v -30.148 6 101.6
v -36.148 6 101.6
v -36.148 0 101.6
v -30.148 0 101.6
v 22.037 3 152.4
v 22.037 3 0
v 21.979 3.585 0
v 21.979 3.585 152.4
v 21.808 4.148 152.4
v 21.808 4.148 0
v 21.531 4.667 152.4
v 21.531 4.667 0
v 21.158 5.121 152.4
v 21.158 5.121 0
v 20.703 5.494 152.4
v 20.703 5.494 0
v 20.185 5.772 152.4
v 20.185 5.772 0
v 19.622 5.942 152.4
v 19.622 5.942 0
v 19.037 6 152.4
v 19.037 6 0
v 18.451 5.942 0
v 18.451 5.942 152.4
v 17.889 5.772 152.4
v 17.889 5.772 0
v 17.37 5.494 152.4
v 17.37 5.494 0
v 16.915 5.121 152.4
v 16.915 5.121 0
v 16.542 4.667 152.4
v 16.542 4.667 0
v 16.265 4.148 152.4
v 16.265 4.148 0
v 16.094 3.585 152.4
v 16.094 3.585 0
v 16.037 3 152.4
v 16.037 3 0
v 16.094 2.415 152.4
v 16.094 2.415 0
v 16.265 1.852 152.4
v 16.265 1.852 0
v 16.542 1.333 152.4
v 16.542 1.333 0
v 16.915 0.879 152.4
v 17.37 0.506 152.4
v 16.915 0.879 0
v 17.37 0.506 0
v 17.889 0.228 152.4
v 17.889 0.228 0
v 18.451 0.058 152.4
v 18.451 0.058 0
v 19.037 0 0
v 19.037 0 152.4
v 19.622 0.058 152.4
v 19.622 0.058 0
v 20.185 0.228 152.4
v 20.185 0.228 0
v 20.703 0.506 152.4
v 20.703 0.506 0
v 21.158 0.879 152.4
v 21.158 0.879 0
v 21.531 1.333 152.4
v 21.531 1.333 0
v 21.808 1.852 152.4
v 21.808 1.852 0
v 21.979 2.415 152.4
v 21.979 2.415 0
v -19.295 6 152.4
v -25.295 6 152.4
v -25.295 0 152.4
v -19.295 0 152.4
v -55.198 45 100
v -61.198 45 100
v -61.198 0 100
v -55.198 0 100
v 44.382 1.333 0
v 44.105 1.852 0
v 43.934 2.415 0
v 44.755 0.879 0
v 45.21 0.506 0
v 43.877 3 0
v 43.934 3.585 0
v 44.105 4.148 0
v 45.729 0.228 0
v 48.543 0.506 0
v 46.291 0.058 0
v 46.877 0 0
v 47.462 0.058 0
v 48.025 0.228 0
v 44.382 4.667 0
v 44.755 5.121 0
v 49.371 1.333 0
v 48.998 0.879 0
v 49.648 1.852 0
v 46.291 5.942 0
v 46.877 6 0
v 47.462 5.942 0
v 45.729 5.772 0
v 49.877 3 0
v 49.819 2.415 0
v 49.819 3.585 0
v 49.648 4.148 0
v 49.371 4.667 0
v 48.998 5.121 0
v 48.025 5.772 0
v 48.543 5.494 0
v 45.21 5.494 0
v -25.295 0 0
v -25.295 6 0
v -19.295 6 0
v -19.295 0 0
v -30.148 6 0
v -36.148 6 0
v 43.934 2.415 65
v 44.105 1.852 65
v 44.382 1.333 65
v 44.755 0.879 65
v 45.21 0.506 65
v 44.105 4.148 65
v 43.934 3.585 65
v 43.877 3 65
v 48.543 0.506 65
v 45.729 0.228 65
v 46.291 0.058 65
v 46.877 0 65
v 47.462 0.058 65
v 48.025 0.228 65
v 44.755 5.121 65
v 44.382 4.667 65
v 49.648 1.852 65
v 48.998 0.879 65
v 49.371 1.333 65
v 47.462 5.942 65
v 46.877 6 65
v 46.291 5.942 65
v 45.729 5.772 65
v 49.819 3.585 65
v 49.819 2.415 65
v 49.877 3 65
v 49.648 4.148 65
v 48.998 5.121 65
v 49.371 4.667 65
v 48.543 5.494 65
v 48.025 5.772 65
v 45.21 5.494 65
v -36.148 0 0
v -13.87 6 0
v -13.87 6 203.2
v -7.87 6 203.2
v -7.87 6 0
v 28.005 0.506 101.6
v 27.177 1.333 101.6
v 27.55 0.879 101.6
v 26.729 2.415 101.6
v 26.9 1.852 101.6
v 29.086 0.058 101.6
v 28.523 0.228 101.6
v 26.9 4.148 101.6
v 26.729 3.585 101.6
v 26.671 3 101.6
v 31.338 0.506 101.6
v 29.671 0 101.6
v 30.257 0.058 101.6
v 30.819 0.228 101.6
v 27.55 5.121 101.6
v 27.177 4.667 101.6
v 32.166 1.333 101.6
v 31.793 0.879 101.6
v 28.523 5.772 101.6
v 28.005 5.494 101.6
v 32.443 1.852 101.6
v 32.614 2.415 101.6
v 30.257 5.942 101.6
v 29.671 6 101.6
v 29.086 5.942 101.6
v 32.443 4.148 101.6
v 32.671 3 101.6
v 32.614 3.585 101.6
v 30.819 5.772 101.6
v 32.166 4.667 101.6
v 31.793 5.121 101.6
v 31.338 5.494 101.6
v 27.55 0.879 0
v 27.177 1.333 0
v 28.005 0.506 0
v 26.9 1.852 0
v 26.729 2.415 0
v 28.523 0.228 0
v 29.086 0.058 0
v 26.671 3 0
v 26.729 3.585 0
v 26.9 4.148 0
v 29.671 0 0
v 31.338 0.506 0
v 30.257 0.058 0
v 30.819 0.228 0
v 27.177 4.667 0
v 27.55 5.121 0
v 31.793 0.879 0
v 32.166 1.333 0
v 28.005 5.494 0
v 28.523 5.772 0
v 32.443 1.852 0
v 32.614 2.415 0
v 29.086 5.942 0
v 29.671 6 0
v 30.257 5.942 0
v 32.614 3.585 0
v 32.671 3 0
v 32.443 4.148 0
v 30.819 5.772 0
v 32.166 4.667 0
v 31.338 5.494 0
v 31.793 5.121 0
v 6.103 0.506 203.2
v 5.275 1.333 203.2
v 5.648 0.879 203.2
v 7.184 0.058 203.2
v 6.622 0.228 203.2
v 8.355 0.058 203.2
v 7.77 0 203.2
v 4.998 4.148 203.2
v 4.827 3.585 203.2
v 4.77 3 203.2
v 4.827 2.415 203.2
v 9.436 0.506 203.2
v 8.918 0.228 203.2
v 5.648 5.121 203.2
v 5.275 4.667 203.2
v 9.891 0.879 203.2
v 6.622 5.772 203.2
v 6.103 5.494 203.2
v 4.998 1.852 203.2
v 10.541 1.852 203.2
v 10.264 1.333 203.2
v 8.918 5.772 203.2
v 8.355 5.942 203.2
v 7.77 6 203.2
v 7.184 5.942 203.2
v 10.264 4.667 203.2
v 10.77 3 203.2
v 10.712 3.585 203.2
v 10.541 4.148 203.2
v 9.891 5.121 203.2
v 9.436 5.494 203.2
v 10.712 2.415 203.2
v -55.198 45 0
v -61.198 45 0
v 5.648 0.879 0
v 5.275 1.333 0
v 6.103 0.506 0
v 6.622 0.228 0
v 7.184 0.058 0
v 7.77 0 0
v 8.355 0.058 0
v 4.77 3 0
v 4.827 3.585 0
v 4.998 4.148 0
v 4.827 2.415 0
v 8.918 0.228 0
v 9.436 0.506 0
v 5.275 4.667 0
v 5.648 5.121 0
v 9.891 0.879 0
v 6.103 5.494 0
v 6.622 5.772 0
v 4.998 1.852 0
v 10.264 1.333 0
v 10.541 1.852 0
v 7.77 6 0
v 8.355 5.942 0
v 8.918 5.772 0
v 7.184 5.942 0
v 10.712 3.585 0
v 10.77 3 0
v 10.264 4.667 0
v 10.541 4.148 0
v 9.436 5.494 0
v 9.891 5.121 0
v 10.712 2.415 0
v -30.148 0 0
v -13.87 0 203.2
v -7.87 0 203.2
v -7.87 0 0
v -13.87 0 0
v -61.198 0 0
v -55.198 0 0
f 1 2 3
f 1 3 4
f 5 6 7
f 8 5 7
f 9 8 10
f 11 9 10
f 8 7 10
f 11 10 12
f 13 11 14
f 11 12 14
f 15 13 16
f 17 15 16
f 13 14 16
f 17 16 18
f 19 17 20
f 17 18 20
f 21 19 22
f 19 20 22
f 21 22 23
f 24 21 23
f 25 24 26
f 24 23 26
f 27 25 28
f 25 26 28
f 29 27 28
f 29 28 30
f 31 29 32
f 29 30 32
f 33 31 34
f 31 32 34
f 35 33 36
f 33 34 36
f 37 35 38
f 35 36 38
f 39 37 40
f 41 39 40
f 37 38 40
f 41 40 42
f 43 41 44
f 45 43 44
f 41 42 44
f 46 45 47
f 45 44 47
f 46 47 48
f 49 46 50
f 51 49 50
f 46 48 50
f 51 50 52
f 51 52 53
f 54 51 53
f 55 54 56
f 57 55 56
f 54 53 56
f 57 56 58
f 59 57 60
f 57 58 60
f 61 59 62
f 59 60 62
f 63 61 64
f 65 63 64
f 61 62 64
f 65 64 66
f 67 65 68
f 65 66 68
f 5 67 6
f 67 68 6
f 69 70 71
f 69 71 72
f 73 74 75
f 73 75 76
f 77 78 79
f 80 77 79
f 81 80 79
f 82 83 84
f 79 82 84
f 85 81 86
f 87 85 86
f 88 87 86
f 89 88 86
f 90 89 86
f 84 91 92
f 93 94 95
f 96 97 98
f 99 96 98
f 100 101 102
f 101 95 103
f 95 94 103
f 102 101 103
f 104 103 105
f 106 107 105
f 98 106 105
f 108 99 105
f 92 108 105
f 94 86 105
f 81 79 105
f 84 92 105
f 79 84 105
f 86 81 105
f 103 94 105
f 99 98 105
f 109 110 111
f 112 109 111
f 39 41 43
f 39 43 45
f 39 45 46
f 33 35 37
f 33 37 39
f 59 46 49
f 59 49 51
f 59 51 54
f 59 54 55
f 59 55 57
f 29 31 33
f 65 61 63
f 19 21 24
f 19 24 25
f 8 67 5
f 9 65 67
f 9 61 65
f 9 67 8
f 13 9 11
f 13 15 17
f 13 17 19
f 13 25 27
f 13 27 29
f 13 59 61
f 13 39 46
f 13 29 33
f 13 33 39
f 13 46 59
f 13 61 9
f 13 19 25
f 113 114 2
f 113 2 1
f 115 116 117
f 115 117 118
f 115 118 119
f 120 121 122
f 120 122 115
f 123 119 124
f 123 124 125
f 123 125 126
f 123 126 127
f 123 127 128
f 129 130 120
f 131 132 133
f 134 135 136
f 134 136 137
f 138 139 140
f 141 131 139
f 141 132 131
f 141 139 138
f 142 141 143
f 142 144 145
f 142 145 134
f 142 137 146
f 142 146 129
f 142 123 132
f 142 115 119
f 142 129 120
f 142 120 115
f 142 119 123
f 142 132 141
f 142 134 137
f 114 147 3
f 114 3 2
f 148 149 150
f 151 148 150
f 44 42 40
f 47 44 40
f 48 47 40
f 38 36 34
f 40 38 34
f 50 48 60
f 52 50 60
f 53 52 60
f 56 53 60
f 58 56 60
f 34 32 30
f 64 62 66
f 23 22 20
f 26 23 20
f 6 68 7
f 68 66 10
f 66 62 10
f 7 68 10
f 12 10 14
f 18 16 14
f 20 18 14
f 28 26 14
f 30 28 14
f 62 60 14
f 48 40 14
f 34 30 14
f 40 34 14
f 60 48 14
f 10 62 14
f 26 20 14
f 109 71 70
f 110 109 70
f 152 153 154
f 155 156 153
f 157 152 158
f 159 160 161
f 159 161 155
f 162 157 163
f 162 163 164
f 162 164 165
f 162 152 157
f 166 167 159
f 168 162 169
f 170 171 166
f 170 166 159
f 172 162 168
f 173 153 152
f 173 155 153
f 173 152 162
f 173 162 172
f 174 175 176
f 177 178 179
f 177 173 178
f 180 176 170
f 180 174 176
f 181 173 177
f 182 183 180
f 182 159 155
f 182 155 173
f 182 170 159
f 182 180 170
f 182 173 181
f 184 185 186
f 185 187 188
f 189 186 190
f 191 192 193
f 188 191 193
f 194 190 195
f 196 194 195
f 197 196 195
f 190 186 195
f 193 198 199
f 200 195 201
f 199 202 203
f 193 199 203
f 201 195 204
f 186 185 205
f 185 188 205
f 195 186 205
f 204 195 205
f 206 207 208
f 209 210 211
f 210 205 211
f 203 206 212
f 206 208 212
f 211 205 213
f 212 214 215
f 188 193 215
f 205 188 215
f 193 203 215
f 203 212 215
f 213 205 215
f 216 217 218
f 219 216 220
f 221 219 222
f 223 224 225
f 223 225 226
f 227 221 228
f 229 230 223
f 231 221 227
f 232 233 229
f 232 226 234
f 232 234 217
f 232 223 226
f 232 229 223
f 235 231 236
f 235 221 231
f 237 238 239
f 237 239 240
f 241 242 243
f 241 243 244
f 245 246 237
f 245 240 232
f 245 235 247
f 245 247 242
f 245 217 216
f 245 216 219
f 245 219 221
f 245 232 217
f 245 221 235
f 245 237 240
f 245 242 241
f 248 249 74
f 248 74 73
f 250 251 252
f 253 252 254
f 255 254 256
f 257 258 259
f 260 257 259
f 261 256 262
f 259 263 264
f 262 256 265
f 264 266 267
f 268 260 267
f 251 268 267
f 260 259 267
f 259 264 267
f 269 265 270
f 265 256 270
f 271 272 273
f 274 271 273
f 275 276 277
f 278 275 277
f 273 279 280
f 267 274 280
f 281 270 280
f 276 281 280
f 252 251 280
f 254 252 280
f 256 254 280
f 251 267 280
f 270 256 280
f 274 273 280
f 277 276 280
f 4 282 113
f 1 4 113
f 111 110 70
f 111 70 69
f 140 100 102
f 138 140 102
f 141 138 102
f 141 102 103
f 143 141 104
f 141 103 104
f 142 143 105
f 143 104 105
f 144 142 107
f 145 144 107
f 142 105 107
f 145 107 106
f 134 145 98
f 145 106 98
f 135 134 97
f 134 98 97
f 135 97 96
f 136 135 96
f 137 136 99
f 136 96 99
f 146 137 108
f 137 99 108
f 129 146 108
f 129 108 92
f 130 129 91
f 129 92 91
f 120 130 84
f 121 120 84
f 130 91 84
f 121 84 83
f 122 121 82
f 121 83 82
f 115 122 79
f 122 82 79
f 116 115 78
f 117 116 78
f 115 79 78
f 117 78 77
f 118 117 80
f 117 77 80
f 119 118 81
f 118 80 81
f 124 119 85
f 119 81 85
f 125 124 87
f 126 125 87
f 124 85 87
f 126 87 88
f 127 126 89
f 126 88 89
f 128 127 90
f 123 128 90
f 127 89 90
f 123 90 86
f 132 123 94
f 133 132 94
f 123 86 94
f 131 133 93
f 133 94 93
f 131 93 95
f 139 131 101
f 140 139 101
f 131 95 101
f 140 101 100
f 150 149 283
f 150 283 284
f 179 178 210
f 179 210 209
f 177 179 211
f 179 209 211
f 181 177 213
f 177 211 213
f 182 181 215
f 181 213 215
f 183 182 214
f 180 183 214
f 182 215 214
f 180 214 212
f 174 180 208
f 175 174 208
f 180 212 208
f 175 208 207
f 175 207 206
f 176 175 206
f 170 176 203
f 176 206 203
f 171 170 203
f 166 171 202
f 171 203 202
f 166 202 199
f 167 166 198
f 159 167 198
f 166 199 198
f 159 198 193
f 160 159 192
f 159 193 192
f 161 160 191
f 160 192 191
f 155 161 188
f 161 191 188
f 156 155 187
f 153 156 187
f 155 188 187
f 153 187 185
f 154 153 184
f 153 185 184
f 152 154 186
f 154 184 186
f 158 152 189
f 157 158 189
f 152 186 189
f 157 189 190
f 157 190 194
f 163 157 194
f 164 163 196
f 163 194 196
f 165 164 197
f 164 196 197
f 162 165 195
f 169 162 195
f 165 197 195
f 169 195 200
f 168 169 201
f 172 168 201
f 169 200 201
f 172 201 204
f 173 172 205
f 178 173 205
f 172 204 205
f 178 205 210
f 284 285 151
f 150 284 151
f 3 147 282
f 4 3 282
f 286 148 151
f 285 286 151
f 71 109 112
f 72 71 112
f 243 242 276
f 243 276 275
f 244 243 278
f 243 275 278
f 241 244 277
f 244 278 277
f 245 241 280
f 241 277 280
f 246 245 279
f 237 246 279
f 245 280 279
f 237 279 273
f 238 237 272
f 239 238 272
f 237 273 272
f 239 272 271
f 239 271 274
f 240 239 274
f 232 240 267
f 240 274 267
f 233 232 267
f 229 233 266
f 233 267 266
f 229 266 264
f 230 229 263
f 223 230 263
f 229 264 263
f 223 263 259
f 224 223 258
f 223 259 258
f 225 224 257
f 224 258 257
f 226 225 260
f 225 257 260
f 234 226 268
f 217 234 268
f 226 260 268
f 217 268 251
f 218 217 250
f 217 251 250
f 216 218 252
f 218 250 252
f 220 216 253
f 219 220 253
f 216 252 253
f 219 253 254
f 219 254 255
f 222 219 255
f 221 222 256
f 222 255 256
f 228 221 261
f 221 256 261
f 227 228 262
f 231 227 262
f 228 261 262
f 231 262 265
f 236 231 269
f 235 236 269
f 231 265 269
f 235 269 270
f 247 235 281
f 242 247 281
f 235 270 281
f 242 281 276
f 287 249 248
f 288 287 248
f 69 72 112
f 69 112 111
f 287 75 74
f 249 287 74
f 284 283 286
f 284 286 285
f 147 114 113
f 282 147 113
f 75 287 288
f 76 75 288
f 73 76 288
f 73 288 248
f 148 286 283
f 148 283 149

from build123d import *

# Parameters (mm, degrees)
F0_W     = 6
F0_H     = 6
F1_DEPTH = 101.6
F2_DEPTH = 152.4
F3_DEPTH = 203.2
F0_R     = 3
F4_DEPTH = 203.2
F5_DEPTH = 152.4
F6_DEPTH = 101.6
F7_DEPTH = 65
F0_H_2   = 45
F8_DEPTH = 100


with BuildPart() as f1:
    # F0 (on Top) → F1 (new body)
    with BuildSketch(Plane.XY):
        with Locations((-33.147974, 3)):
            Rectangle(F0_W, F0_H)
    extrude(amount=F1_DEPTH)


with BuildPart() as f2:
    # F0 (on Top) → F2 (new body)
    with BuildSketch(Plane.XY):
        with Locations((-22.295299, 3)):
            Rectangle(F0_W, F0_H)
    extrude(amount=F2_DEPTH)


with BuildPart() as f3:
    # F0 (on Top) → F3 (new body)
    with BuildSketch(Plane.XY):
        with Locations((-10.870221, 3)):
            Rectangle(F0_W, F0_H)
    extrude(amount=F3_DEPTH)


with BuildPart() as f4:
    # F0 (on Top) → F4 (new body)
    with BuildSketch(Plane.XY):
        with Locations((7.769686, 3)):
            Circle(F0_R)
    extrude(amount=F4_DEPTH)


with BuildPart() as f5:
    # F0 (on Top) → F5 (new body)
    with BuildSketch(Plane.XY):
        with Locations((19.036578, 3)):
            Circle(F0_R)
    extrude(amount=F5_DEPTH)


with BuildPart() as f6:
    # F0 (on Top) → F6 (new body)
    with BuildSketch(Plane.XY):
        with Locations((29.671375, 3)):
            Circle(F0_R)
    extrude(amount=F6_DEPTH)


with BuildPart() as f7:
    # F0 (on Top) → F7 (new body)
    with BuildSketch(Plane.XY):
        with Locations((46.876561, 3)):
            Circle(F0_R)
    extrude(amount=F7_DEPTH)


with BuildPart() as f8:
    # F0 (on Top) → F8 (new body)
    with BuildSketch(Plane.XY):
        with Locations((-58.198242, 22.5)):
            Rectangle(F0_W, F0_H_2)
    extrude(amount=F8_DEPTH)


solid = Compound([f1.part, f2.part, f3.part, f4.part, f5.part, f6.part, f7.part, f8.part])
